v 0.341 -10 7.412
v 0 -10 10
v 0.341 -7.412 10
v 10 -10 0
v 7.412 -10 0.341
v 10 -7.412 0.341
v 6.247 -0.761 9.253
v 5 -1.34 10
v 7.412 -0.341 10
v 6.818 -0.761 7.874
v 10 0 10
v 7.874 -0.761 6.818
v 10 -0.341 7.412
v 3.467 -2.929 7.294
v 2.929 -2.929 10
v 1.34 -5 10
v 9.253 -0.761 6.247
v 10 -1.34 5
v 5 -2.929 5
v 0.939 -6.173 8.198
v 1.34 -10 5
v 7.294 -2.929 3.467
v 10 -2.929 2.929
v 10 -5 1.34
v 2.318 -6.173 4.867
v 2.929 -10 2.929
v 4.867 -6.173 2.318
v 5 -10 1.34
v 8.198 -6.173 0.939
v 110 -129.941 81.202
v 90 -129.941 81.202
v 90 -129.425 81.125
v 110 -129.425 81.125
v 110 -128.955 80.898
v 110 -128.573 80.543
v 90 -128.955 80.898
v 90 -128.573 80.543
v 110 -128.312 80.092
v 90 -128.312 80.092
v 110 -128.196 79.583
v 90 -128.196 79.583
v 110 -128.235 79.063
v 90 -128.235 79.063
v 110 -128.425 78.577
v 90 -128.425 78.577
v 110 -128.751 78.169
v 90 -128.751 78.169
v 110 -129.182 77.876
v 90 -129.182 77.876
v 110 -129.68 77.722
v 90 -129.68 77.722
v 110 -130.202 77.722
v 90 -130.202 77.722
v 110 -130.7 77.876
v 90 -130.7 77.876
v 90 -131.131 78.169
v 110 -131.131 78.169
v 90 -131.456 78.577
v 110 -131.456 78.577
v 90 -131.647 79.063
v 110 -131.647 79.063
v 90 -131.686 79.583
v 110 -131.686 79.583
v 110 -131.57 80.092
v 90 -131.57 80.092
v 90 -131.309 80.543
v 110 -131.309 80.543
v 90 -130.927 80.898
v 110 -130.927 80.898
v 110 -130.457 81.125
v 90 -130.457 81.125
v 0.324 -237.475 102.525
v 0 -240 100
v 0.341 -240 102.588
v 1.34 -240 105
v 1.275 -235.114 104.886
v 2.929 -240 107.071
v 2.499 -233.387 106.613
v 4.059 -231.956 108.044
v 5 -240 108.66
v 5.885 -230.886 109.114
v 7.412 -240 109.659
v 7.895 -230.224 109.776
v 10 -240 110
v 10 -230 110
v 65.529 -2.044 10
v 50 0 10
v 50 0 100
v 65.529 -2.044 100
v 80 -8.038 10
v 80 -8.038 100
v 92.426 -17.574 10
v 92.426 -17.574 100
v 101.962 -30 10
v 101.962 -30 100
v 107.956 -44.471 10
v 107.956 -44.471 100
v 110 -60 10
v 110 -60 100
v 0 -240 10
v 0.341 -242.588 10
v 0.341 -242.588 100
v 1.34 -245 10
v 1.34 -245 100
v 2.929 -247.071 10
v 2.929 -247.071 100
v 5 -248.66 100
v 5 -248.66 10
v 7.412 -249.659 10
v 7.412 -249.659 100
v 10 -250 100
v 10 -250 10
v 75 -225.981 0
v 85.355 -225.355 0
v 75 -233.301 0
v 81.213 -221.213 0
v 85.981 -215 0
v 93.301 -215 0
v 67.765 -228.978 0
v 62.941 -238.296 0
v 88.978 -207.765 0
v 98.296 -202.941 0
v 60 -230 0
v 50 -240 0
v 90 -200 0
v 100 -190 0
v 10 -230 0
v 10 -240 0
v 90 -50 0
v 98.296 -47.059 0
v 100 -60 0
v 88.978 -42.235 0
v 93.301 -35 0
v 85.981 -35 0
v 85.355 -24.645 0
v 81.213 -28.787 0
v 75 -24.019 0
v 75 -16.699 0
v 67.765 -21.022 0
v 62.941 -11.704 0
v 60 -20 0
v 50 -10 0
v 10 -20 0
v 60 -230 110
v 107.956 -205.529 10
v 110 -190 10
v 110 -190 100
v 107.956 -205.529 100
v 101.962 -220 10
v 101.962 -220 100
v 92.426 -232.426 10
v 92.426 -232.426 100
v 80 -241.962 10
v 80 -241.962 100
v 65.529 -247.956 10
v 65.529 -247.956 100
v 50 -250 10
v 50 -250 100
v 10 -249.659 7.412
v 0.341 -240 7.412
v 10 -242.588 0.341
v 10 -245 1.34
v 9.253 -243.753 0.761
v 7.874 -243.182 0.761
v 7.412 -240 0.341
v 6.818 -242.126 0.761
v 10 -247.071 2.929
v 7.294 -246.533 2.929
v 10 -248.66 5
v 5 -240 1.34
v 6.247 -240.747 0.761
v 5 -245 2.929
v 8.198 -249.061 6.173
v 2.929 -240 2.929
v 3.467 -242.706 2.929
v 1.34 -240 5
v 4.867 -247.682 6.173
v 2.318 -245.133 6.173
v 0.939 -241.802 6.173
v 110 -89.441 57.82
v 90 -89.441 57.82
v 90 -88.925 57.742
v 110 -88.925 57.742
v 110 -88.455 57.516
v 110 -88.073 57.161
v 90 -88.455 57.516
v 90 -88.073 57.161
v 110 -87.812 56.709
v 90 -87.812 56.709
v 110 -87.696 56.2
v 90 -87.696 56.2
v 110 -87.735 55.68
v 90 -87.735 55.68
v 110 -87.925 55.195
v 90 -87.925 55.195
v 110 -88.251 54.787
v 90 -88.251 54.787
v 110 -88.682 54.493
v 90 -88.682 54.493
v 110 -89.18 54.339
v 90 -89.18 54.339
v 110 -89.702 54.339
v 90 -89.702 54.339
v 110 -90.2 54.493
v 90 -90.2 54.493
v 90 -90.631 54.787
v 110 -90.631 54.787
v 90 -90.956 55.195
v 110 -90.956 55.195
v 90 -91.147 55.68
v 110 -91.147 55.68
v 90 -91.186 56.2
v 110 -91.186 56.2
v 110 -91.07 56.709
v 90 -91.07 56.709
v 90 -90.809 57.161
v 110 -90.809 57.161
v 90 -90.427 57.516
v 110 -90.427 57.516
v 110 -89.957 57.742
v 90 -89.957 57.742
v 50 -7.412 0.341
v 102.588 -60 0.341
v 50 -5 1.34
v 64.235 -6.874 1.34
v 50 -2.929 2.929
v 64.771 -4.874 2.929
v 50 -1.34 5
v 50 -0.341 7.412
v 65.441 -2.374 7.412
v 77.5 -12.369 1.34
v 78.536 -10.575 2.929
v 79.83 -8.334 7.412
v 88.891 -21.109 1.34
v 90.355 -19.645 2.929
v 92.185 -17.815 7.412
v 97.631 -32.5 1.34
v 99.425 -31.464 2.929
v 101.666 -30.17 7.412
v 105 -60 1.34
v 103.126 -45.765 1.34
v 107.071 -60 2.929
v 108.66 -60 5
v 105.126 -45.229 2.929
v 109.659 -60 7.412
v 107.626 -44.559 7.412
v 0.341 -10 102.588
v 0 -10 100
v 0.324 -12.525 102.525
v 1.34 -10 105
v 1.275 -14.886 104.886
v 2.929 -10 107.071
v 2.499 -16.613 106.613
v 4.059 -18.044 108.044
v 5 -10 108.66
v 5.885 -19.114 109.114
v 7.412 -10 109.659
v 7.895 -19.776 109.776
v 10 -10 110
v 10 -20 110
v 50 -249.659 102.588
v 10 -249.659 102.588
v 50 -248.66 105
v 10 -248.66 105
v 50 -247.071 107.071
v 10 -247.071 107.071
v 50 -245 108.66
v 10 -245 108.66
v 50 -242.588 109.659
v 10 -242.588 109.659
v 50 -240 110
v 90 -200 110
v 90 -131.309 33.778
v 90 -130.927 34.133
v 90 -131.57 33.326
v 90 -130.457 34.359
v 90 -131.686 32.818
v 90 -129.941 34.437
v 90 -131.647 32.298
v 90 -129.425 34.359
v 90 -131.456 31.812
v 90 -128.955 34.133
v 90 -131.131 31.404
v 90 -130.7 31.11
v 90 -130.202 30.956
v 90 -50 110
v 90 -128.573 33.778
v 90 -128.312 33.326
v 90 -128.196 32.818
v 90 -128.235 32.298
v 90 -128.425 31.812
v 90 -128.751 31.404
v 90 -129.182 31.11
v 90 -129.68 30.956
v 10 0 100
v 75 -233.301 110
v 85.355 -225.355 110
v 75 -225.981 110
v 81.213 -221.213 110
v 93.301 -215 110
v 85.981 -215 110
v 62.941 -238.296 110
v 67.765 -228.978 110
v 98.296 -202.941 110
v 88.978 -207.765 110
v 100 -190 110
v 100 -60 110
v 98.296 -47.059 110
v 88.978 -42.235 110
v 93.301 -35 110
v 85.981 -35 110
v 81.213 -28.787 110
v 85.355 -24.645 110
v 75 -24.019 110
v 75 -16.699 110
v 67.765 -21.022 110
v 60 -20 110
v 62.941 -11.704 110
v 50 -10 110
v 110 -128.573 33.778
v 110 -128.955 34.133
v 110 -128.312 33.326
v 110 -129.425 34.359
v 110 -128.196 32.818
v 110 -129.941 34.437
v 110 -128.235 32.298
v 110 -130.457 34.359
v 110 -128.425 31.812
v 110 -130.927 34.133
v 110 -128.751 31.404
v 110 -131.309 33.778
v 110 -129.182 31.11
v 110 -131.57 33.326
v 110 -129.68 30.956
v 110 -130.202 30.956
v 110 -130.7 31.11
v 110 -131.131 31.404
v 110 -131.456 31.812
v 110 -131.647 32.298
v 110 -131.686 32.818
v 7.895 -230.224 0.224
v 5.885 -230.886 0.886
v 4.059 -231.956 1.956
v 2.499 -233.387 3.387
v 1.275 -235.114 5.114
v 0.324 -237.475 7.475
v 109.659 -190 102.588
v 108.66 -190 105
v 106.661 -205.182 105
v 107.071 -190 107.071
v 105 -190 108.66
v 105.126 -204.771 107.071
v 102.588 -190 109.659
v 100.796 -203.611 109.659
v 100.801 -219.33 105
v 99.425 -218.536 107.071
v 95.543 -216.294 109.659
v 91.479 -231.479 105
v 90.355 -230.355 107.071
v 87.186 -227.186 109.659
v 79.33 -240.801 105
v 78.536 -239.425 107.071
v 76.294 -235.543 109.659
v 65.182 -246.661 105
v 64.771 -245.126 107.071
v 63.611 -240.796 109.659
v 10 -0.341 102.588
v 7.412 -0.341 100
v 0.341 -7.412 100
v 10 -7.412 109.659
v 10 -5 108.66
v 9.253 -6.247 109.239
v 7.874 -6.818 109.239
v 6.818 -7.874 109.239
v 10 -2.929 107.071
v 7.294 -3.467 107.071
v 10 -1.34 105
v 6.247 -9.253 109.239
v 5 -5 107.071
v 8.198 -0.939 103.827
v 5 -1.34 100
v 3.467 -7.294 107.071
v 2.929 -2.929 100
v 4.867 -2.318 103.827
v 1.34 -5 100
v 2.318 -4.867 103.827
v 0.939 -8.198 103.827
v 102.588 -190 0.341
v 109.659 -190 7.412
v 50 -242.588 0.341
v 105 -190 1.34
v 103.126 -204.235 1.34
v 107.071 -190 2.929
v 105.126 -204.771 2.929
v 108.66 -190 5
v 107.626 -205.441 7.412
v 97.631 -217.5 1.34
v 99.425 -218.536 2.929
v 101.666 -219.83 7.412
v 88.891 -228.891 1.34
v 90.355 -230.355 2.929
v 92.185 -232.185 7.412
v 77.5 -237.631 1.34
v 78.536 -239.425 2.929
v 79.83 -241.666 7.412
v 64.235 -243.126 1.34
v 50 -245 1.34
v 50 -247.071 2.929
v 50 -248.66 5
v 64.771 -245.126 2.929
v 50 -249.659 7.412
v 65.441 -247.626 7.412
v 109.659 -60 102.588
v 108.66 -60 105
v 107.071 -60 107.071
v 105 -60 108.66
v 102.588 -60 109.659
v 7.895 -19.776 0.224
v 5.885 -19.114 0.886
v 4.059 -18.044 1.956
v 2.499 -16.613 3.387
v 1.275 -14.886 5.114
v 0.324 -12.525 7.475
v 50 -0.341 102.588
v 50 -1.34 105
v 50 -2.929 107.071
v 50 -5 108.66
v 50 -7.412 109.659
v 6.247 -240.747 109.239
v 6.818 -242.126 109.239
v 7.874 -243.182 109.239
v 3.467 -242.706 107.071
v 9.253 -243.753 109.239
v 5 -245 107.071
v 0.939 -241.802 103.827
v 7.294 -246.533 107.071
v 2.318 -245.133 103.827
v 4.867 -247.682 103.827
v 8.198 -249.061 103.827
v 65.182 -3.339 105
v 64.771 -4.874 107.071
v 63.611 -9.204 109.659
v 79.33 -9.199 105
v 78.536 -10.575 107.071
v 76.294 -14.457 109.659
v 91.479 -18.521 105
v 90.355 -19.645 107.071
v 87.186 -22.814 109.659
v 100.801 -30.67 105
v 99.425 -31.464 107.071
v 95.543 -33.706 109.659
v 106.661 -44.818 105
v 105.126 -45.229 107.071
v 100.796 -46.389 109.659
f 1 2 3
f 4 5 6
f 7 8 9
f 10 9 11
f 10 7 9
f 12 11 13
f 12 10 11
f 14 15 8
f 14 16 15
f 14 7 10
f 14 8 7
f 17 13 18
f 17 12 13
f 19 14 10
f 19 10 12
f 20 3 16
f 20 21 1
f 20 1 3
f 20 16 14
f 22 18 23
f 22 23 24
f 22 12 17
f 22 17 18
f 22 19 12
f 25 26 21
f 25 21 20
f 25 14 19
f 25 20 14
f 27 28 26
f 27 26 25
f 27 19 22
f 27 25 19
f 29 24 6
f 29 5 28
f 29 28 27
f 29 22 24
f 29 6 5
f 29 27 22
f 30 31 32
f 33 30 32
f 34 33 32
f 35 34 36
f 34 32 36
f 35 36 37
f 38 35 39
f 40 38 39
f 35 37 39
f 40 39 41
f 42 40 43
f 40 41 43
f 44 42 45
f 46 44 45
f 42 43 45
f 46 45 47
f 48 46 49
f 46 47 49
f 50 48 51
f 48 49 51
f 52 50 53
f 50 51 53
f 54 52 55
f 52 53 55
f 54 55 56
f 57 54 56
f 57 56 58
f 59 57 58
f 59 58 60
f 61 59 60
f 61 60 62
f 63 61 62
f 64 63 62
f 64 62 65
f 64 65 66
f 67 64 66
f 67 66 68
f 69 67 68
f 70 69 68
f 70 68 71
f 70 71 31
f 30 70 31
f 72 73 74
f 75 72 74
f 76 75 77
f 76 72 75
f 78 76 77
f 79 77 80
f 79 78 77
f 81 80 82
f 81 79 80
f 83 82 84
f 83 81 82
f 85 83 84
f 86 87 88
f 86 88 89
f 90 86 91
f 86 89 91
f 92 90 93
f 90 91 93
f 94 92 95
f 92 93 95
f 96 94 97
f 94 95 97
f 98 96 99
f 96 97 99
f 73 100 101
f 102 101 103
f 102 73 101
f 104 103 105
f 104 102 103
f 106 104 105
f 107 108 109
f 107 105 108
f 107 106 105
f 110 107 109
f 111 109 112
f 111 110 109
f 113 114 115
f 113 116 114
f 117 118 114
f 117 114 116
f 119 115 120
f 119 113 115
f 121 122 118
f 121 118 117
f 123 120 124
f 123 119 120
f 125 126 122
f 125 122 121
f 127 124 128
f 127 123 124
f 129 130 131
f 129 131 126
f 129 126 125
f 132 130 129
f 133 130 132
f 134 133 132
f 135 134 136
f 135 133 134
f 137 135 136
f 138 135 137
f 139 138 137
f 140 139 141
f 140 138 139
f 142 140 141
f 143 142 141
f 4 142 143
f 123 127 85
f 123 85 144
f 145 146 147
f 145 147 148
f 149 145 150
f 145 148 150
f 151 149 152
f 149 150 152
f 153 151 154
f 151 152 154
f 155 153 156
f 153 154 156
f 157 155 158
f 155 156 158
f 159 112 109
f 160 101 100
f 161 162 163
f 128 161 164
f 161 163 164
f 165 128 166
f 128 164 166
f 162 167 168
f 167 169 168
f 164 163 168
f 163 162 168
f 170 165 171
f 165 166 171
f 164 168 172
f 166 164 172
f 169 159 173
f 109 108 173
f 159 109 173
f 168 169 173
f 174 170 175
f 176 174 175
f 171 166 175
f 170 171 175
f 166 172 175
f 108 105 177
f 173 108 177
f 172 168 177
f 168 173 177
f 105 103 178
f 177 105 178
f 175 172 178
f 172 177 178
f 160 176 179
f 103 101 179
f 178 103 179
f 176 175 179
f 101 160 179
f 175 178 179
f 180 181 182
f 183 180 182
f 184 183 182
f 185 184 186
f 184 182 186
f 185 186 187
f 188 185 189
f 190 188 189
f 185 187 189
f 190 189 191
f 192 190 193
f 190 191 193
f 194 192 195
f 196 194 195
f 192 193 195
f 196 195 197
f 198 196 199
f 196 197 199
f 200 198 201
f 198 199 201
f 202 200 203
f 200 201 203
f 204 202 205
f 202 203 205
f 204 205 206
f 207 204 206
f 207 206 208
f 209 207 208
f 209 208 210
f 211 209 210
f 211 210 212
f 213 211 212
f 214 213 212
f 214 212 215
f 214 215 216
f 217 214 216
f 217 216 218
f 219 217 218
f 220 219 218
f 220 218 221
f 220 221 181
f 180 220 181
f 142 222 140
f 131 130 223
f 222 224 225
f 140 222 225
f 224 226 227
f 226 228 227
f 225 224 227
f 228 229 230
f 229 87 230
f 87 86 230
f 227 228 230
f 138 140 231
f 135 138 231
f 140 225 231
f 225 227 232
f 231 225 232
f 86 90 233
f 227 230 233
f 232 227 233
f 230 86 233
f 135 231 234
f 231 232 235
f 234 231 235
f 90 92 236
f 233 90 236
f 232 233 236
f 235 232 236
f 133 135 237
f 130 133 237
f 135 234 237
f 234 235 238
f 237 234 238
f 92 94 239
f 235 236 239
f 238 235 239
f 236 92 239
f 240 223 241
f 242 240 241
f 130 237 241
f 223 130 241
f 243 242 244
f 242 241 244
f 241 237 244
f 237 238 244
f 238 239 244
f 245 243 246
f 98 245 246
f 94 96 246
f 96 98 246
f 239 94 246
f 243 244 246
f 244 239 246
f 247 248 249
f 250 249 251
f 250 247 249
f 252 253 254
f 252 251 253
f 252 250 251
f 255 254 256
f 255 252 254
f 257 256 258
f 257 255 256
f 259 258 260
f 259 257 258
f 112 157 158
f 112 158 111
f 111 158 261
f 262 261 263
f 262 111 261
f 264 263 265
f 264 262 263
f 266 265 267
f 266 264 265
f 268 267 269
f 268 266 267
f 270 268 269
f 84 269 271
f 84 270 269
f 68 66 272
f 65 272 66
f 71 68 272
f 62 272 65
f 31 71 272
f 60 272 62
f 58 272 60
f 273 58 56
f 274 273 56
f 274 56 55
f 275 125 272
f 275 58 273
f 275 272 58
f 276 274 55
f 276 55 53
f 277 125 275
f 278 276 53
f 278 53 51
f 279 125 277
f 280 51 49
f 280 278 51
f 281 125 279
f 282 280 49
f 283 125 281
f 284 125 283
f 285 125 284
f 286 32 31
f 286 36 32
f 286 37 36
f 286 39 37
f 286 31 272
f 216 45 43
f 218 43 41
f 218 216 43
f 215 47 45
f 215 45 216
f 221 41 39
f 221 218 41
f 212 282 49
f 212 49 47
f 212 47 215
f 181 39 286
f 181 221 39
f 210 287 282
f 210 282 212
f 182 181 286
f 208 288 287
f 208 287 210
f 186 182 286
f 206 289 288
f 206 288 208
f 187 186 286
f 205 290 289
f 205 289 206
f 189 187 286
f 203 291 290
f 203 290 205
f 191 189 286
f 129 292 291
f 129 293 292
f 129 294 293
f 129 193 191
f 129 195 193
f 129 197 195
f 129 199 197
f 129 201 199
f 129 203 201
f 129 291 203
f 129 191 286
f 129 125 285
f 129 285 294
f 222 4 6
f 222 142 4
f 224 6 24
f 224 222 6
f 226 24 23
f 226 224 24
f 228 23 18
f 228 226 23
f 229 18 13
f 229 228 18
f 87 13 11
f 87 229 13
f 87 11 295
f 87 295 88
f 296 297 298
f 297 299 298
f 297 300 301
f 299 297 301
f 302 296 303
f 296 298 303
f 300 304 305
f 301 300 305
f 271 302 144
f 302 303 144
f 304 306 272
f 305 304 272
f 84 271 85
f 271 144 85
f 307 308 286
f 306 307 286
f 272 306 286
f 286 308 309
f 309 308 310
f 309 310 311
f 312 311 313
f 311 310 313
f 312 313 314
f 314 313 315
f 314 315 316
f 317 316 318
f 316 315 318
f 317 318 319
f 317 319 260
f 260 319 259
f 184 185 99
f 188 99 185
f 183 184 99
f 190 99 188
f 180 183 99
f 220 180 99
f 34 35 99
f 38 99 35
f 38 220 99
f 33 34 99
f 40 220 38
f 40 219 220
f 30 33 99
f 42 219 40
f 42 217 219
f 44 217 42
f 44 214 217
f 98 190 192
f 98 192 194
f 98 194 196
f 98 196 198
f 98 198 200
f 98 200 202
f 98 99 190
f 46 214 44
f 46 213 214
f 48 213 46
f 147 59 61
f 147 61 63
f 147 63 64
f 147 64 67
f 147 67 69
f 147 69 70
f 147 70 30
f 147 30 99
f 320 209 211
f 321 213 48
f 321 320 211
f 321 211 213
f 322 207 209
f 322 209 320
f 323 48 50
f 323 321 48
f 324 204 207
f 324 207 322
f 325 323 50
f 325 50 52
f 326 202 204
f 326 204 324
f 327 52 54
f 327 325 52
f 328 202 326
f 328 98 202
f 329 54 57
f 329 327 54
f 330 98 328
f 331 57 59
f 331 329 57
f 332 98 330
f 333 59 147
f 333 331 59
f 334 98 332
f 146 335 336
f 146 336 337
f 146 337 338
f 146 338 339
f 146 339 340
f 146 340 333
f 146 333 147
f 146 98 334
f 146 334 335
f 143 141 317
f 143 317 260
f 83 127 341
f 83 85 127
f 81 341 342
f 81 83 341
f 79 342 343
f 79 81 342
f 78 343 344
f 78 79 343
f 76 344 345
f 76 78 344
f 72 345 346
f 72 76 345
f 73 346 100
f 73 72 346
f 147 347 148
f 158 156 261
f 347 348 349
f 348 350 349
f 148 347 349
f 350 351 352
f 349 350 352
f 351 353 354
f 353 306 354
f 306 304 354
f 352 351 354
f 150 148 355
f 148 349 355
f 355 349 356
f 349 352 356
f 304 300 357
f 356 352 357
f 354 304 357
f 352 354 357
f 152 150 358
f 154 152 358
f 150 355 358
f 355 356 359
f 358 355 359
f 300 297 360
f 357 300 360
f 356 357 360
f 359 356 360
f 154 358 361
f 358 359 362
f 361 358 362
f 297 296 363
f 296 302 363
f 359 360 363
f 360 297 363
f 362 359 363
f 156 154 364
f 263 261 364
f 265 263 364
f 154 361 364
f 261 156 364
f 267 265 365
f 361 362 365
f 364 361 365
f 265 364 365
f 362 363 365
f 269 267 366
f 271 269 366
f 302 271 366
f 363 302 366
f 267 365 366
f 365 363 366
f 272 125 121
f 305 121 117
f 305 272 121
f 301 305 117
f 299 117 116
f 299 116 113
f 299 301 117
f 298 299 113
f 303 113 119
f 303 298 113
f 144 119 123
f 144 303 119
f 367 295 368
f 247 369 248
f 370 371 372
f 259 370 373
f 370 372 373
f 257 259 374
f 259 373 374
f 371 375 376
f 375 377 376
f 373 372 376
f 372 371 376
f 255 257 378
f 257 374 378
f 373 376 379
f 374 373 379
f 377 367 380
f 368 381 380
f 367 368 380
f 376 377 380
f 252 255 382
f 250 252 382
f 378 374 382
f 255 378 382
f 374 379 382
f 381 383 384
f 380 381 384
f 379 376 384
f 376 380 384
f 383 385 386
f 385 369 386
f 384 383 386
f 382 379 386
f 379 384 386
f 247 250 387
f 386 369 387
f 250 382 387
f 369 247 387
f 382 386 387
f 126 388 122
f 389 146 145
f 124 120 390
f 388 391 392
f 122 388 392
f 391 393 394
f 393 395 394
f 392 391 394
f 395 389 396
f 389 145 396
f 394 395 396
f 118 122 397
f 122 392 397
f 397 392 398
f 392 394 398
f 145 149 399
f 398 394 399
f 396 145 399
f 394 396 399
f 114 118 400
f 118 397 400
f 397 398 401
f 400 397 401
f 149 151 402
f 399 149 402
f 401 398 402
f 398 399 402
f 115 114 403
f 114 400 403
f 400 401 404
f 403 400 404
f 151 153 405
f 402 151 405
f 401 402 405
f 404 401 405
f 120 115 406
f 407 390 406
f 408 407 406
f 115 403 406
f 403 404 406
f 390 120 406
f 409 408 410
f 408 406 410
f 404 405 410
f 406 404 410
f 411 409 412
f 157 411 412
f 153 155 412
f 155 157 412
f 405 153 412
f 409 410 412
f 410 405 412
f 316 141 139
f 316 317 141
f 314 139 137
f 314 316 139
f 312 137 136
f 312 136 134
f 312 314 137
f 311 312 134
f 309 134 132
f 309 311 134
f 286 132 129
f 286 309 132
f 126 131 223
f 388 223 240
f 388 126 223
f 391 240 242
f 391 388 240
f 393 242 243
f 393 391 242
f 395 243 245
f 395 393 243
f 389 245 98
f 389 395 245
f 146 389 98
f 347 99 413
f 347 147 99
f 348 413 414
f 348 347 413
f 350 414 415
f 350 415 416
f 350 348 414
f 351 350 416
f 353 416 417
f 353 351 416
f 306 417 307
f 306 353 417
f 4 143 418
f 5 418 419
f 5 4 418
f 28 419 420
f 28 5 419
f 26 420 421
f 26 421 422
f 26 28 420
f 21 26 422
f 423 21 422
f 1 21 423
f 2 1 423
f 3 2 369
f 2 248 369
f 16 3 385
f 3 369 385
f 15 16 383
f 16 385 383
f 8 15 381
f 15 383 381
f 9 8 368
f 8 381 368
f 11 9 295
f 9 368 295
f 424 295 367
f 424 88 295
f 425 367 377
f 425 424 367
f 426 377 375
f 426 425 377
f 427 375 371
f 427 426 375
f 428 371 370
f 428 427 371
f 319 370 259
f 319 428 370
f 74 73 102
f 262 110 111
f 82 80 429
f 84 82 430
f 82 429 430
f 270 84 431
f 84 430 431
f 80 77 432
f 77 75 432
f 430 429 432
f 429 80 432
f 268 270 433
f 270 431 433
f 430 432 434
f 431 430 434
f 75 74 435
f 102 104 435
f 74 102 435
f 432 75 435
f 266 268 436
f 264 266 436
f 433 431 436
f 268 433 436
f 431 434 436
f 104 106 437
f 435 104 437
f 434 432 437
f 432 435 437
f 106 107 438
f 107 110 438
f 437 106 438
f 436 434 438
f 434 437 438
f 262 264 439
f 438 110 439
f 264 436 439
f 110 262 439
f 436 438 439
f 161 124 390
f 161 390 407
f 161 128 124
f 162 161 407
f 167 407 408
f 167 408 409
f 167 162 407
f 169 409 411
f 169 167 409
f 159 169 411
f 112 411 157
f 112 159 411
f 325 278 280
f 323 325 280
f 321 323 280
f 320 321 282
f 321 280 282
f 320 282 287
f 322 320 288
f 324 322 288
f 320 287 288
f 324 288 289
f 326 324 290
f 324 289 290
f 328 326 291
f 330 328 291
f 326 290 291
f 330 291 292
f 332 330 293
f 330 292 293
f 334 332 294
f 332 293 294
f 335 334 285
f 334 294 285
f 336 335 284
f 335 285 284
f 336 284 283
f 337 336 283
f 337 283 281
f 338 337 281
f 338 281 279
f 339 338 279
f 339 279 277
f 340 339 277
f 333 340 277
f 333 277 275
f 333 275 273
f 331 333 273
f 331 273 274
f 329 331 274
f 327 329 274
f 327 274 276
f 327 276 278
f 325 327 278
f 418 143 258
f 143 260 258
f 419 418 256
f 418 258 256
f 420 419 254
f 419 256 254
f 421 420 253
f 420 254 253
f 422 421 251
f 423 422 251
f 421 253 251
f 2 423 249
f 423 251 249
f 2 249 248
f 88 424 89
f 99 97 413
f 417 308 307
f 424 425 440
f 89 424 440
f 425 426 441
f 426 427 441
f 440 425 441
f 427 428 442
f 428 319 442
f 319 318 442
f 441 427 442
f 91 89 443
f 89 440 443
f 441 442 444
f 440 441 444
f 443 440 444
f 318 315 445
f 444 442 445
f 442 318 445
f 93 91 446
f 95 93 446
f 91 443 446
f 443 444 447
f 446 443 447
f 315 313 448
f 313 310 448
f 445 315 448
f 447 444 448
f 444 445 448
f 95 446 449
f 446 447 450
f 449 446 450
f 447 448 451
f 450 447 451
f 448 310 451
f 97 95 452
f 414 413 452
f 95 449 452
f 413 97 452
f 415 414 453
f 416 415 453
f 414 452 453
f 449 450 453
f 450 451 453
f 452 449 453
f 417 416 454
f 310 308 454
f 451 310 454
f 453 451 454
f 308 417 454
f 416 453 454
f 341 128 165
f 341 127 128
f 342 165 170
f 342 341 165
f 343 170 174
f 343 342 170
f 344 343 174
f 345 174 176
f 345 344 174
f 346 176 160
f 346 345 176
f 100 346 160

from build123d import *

# Parameters (mm, degrees)
BOSS_EXTRUDE1_DEPTH = 110
FILLET1_R           = 60
FILLET3_R           = 30
FILLET4_R           = 10
SKETCH2_R           = 1.75
CUT_EXTRUDE1_DEPTH  = 250


with BuildPart() as part:
    # Sketch1 → Boss-Extrude1 (new body)
    with BuildSketch(Plane.XY):
        Polygon((0, 0), (110, 0), (110, -250), (0, -250), (0, -230), (90, -230), (90, -20), (0, -20), align=None)
    extrude(amount=BOSS_EXTRUDE1_DEPTH)

    # Fillet1
    fillet1_edges = [part.edges().sort_by_distance(p)[0] for p in [
        (110, 0, 55),
        (110, -250, 55),
    ]]
    fillet(fillet1_edges, radius=FILLET1_R)

    # Fillet3
    fillet3_edges = [part.edges().sort_by_distance(p)[0] for p in [
        (90, -230, 55),
        (90, -20, 55),
    ]]
    fillet(fillet3_edges, radius=FILLET3_R)

    # Fillet4
    fillet4_edges = [part.edges().sort_by_distance(p)[0] for p in [
        (0, -10, 0),
        (0, 0, 55),
        (0, -250, 55),
        (0, -230, 55),
        (0, -20, 55),
        (0, -240, 110),
        (25, 0, 0),
        (25, 0, 110),
        (25, -250, 110),
        (110, -125, 0),
        (92.426406871, -232.426406871, 0),
        (92.426406871, -17.573593129, 0),
        (110, -125, 110),
        (92.426406871, -232.426406871, 110),
        (92.426406871, -17.573593129, 110),
        (0, -10, 110),
        (25, -250, 0),
        (0, -240, 0),
    ]]
    fillet(fillet4_edges, radius=FILLET4_R - 0.0001)  # a hair under: the kernel refuses the full size

    # Sketch2 → Cut-Extrude1 (cut)
    with BuildSketch(Plane.ZY.offset(-90)):
        with Locations((56.069625953, -89.440859908)):
            Circle(SKETCH2_R)
        with Locations((79.452311855, -129.940859908)):
            Circle(SKETCH2_R)
        with Locations((32.686940051, -129.940859908)):
            Circle(SKETCH2_R)
    extrude(amount=-CUT_EXTRUDE1_DEPTH, mode=Mode.SUBTRACT)


solid = part.part
